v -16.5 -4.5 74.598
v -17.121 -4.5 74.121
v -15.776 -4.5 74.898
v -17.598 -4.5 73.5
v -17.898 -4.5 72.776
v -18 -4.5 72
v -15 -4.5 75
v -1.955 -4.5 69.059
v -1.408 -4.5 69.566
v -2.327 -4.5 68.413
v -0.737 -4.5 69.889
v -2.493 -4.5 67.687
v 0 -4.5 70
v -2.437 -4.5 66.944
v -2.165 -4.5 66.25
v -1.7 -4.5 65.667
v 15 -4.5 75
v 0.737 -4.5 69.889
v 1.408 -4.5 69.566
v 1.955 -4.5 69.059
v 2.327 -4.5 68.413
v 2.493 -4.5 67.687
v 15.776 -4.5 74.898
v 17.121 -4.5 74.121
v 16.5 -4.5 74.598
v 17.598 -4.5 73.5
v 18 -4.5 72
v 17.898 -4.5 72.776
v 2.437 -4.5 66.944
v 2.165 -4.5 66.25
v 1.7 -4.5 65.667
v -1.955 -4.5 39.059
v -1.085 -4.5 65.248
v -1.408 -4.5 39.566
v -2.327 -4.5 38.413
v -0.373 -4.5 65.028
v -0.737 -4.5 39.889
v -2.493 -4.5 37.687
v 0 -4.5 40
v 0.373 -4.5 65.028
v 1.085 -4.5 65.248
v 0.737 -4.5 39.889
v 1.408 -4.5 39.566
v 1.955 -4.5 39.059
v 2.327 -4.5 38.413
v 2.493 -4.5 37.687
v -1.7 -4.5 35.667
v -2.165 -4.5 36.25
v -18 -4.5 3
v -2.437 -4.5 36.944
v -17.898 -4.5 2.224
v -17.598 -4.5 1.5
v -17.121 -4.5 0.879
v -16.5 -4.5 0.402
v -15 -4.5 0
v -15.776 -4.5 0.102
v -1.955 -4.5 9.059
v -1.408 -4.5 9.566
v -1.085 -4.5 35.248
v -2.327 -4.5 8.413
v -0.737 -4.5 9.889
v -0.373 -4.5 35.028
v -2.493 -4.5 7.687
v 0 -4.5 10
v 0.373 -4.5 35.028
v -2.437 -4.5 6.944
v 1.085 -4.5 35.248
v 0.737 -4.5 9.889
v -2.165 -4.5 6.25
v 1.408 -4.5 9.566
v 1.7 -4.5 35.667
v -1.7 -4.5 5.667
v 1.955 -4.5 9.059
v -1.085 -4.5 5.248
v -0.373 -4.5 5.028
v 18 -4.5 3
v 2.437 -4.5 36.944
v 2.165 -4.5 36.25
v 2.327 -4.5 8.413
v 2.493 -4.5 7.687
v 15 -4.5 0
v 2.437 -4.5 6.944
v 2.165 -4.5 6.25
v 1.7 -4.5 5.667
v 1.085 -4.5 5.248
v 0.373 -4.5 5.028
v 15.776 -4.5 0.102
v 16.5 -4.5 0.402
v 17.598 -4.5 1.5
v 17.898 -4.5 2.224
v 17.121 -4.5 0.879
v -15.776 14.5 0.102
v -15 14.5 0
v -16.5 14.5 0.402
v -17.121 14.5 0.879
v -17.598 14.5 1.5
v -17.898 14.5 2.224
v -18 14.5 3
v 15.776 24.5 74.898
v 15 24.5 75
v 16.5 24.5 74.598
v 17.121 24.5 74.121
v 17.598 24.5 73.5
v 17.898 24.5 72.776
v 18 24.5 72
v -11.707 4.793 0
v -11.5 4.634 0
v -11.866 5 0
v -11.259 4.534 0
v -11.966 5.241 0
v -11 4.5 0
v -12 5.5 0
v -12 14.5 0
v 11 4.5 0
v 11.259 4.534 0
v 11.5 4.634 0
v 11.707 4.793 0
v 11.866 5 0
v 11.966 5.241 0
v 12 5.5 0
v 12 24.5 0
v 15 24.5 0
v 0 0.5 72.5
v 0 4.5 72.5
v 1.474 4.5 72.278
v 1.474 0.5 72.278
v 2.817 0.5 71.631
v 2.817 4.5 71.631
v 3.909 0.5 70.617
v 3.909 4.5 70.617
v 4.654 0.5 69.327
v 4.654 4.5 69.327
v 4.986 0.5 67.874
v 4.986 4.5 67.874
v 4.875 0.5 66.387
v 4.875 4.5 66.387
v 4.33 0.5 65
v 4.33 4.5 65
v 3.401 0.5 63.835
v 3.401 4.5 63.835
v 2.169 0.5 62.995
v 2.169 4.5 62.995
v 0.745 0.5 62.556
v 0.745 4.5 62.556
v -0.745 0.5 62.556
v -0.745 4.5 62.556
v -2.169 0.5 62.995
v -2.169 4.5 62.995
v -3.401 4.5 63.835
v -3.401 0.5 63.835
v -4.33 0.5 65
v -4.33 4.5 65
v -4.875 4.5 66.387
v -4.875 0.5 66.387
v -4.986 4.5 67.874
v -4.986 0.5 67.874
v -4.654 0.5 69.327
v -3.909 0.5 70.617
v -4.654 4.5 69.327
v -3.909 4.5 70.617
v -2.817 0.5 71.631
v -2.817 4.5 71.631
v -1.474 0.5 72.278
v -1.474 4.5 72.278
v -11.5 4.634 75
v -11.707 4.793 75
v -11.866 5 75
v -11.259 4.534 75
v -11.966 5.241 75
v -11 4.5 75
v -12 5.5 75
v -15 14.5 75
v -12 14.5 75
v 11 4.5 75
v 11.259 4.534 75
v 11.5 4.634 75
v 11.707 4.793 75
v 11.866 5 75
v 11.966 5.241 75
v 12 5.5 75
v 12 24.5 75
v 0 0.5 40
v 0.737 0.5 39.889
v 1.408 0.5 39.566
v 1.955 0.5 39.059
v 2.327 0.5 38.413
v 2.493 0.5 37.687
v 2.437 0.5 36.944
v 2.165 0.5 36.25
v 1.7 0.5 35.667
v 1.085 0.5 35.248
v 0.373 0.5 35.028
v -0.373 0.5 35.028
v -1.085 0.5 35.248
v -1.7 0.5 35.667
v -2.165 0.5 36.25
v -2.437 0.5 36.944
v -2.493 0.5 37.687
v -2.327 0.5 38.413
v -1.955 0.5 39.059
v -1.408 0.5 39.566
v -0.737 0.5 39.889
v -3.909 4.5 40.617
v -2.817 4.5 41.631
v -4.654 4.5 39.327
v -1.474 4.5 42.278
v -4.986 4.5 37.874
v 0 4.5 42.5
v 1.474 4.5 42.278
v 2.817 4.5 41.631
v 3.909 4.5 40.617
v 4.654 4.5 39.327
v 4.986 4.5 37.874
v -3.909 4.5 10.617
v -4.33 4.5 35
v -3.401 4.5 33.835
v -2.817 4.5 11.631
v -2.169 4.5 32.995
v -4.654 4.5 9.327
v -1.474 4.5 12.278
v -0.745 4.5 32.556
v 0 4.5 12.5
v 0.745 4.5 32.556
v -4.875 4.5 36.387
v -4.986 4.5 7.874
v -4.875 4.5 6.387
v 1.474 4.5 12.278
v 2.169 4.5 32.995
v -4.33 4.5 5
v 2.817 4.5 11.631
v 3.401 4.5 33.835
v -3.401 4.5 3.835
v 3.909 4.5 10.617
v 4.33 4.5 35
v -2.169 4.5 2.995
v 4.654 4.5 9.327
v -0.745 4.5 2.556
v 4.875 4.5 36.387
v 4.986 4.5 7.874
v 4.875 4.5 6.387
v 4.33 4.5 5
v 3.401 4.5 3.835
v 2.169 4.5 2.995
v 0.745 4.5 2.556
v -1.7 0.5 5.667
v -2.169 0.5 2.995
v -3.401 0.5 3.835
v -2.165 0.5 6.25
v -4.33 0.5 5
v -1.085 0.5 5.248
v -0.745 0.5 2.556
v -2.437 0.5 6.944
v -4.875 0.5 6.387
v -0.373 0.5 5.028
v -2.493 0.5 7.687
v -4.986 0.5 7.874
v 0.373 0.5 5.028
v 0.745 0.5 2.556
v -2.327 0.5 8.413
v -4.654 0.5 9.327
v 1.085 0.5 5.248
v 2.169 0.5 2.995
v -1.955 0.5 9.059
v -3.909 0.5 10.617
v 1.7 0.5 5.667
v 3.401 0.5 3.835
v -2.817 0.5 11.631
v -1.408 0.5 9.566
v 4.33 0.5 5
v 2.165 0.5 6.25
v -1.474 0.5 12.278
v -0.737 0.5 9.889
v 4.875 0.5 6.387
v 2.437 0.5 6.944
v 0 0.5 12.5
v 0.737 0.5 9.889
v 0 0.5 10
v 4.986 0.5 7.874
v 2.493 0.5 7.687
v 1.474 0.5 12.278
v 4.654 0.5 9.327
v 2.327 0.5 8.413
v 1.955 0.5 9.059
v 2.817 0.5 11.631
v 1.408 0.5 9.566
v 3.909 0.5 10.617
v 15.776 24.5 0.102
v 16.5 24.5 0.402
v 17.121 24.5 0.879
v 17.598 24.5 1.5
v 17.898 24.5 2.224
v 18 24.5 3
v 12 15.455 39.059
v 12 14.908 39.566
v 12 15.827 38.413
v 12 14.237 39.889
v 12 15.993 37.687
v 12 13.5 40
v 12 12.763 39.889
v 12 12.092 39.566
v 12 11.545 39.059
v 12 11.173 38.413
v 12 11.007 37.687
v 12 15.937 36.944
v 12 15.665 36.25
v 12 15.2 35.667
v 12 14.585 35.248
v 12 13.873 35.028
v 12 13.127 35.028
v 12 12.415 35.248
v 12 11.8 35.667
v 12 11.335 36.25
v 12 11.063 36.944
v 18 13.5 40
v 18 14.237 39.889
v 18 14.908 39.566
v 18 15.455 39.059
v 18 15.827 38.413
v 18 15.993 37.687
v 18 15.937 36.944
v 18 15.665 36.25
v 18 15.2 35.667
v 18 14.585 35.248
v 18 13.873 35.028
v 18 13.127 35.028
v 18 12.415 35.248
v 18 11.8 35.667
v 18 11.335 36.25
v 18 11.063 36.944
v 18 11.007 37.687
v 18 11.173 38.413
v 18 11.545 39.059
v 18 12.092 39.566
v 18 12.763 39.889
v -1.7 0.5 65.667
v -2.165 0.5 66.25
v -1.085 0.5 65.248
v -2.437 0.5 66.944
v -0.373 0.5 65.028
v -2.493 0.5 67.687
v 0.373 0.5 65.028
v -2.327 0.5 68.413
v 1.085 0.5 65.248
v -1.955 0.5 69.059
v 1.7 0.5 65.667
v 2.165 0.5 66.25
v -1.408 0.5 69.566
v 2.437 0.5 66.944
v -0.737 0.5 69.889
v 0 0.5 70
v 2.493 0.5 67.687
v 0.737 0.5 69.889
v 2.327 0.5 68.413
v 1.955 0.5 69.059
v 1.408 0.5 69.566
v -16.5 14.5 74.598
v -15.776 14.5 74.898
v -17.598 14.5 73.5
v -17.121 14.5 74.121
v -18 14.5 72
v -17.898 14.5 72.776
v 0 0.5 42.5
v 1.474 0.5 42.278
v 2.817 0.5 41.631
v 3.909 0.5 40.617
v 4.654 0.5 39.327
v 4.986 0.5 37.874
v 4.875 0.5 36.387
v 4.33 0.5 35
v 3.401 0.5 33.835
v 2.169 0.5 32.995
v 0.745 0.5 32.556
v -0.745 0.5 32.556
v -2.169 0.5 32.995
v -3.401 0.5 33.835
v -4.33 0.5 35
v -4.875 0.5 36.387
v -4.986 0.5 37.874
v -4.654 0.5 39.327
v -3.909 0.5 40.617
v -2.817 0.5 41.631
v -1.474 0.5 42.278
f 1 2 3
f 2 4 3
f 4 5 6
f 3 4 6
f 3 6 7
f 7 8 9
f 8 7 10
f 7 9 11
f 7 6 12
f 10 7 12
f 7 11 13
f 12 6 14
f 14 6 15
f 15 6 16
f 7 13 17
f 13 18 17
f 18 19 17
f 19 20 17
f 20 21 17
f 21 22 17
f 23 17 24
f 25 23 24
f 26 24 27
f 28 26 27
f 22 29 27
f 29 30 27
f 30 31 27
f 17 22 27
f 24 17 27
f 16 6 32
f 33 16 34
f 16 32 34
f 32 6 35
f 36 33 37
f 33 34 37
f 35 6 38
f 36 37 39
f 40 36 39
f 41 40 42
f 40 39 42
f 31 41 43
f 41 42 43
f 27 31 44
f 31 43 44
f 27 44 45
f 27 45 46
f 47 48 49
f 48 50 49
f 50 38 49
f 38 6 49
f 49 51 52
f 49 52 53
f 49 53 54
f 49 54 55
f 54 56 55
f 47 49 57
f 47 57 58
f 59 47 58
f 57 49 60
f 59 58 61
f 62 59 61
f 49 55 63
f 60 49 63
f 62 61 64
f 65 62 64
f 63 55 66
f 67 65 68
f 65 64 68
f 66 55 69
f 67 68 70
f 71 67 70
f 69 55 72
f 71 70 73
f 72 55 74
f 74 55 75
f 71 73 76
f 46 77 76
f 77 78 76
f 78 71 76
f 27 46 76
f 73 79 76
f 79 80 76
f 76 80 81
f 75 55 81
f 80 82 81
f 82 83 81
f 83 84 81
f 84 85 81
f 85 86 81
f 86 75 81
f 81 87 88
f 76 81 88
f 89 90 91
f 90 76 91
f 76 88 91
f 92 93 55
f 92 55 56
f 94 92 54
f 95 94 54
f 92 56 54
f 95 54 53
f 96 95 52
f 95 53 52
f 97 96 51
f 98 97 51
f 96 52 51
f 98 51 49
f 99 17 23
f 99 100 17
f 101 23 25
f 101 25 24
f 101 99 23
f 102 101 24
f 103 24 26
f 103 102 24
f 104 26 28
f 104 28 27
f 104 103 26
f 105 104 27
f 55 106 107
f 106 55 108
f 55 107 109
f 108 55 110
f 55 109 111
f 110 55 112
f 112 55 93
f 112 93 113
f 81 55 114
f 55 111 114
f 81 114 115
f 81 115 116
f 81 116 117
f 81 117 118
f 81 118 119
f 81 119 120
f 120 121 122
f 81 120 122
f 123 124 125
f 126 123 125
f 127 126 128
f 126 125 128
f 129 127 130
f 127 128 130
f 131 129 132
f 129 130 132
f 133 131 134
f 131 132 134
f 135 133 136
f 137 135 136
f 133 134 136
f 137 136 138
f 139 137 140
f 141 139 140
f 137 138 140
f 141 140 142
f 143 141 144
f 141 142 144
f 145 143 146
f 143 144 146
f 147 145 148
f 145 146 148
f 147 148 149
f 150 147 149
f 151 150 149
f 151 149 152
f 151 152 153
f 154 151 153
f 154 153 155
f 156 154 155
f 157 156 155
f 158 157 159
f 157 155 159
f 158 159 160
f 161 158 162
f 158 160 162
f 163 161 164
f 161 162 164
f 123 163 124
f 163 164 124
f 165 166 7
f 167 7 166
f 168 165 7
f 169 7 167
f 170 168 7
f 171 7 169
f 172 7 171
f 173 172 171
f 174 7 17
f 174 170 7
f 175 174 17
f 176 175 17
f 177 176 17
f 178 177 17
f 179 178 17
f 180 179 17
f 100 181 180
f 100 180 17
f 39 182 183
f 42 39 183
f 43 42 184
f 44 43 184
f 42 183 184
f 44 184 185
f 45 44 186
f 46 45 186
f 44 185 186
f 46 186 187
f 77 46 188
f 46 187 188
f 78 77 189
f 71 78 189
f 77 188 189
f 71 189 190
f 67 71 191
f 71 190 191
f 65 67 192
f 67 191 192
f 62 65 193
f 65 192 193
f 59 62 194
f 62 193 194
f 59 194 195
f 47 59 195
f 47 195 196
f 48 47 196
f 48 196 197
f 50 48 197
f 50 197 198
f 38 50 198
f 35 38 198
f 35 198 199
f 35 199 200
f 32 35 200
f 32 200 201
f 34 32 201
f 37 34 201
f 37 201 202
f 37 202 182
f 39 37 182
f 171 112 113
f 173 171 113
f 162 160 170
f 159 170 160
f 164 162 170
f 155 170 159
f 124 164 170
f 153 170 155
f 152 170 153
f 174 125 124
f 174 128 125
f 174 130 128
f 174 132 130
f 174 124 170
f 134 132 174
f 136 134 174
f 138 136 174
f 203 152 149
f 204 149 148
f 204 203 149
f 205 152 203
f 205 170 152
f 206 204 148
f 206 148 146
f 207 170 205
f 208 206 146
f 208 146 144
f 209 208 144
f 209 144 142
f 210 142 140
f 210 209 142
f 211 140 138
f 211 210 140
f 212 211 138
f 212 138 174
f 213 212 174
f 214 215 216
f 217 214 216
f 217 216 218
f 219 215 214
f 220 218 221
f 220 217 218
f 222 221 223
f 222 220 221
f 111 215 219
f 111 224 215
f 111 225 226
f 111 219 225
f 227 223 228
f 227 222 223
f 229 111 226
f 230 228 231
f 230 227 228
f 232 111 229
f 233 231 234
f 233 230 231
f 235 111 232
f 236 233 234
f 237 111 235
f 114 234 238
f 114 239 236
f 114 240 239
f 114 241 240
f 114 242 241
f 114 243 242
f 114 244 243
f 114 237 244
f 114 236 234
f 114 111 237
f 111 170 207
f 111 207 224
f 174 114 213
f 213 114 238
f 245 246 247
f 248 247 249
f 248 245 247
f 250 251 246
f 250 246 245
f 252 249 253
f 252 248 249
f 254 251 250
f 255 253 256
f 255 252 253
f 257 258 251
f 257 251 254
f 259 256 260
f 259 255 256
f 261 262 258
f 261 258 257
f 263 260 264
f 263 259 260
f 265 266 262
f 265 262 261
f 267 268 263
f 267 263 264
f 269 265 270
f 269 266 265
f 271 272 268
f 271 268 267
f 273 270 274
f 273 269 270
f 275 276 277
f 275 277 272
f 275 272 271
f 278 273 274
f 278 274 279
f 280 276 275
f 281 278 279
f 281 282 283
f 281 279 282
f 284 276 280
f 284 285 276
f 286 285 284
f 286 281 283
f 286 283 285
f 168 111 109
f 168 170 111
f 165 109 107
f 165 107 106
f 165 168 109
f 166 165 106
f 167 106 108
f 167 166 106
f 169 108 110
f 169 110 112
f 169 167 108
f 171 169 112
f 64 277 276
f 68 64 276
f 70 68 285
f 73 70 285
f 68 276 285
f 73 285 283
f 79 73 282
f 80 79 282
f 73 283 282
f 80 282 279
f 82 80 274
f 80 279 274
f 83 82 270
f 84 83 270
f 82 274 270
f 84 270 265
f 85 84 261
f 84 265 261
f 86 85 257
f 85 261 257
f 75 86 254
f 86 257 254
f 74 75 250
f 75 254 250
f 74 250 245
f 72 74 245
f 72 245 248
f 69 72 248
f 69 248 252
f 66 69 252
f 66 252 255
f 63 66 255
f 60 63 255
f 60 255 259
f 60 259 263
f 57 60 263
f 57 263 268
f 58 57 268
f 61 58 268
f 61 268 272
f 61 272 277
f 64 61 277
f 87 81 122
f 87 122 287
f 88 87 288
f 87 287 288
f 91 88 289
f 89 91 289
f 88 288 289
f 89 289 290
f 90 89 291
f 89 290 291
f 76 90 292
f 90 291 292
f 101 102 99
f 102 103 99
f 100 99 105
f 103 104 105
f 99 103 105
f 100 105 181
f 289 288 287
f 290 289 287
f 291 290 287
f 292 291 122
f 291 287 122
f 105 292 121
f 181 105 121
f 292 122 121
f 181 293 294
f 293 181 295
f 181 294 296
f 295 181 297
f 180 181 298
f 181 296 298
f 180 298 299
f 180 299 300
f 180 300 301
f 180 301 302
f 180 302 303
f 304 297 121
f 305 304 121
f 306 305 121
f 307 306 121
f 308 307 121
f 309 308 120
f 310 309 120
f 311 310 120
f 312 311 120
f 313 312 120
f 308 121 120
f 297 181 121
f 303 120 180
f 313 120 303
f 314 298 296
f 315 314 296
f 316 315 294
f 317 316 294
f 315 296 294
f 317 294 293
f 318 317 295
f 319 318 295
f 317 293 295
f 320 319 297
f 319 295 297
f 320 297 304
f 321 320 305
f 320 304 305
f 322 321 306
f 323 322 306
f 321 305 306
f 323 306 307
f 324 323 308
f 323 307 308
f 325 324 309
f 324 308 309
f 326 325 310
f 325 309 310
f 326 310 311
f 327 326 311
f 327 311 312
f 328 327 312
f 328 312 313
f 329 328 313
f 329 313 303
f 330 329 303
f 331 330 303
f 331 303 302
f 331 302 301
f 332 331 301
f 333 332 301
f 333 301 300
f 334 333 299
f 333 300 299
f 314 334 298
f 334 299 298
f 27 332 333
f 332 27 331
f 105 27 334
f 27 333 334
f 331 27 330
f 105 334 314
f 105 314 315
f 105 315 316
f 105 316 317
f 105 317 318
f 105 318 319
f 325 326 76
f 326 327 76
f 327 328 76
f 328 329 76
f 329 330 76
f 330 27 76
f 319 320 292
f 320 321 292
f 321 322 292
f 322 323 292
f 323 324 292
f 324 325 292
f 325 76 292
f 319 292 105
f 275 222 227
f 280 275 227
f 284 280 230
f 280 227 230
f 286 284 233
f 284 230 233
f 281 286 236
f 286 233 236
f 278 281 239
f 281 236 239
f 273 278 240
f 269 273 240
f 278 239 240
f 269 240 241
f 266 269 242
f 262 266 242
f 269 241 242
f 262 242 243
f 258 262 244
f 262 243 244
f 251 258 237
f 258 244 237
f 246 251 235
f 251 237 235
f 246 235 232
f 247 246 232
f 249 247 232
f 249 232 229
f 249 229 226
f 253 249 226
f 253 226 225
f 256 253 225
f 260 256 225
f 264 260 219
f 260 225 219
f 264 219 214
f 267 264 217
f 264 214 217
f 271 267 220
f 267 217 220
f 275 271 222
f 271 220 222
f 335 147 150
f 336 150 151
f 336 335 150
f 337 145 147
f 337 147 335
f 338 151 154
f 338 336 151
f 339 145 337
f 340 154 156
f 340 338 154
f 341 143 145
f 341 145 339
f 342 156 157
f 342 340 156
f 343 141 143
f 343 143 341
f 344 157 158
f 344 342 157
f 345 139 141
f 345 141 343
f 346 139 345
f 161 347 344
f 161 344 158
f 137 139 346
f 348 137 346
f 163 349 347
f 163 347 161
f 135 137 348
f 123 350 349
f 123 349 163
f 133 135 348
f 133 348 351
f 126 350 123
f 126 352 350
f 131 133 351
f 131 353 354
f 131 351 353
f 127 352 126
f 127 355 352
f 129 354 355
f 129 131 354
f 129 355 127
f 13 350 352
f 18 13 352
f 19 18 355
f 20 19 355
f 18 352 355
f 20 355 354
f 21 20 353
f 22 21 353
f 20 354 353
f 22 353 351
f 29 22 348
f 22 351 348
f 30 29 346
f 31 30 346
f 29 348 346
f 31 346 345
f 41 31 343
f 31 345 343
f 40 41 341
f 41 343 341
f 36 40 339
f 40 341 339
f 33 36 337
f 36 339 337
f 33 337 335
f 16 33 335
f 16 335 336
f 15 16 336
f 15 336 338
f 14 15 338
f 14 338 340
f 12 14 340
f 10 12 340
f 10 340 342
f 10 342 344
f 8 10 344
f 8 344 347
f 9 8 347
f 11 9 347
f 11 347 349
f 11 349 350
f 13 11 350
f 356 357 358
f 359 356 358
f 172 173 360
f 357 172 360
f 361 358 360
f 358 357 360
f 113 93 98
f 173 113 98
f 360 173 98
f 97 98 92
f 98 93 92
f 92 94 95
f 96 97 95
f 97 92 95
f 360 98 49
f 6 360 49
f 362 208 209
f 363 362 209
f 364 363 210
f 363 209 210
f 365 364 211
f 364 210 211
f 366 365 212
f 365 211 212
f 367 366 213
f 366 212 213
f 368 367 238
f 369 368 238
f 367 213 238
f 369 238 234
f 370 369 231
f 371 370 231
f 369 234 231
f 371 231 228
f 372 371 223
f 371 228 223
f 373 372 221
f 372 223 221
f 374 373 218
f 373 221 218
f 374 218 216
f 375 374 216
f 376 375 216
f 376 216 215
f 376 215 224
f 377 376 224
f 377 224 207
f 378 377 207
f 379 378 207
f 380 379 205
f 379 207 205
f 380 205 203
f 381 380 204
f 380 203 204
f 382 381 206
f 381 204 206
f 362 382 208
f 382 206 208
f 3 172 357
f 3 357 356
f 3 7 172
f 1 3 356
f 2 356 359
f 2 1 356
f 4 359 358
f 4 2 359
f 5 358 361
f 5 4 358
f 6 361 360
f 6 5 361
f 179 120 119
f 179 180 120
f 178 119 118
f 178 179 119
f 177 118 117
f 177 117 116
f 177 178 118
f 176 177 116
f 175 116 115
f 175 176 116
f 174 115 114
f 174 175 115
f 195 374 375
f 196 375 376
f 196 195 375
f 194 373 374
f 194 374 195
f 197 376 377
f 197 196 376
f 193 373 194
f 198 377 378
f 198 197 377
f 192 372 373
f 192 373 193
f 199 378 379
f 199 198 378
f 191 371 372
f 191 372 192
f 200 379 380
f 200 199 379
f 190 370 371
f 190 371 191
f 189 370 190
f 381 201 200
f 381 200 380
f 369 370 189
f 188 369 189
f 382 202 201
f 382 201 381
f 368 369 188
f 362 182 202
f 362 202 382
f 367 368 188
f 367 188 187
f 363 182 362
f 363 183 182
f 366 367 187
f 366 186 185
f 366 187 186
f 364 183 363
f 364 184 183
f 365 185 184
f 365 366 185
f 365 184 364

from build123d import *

# Parameters (mm, degrees)
SKETCH1_W           = 24
SKETCH1_H           = 9
BOSS_EXTRUDE1_DEPTH = 75
FILLET1_R           = 1
FILLET2_R           = 3
SKETCH2_R           = 2.5
CUT_EXTRUDE1_DEPTH  = 6
SKETCH3_R           = 2.5
CUT_EXTRUDE2_DEPTH  = 10
SKETCH4_R           = 5
CUT_EXTRUDE3_DEPTH  = 4


with BuildPart() as part:
    # Sketch1 → Boss-Extrude1 (new body)
    with BuildSketch(Plane.XY):
        Polygon((-18, -4.5), (-12, -4.5), (-12, 4.5), (-12, 14.5), (-18, 14.5), align=None)
        Rectangle(SKETCH1_W, SKETCH1_H)
        Polygon((12, 4.5), (12, -4.5), (18, -4.5), (18, 24.5), (12, 24.5), align=None)
    extrude(amount=BOSS_EXTRUDE1_DEPTH)

    # Fillet1
    fillet1_edges = [part.edges().sort_by_distance(p)[0] for p in [
        (-12, 4.5, 37.5),
        (12, 4.5, 37.5),
    ]]
    fillet(fillet1_edges, radius=FILLET1_R)

    # Fillet2
    fillet2_edges = [part.edges().sort_by_distance(p)[0] for p in [
        (18, 10, 0),
        (-18, 5, 0),
        (18, 10, 75),
        (-18, 5, 75),
    ]]
    fillet(fillet2_edges, radius=FILLET2_R)

    # Sketch2 → Cut-Extrude1 (cut)
    with BuildSketch(Plane.ZY.offset(-12)):
        with Locations((37.5, 13.5)):
            Circle(SKETCH2_R)
    extrude(amount=-CUT_EXTRUDE1_DEPTH, mode=Mode.SUBTRACT)

    # Sketch3 → Cut-Extrude2 (cut)
    with BuildSketch(Plane(origin=(0, 4.5, 0), x_dir=(1, 0, 0), z_dir=(0, 1, 0))):
        with Locations(Location((0, -37.5, 0), (0, 0, 270))):
            Circle(SKETCH3_R)
        with Locations(Location((0, -7.5, 0), (0, 0, 270))):
            Circle(SKETCH3_R)
        with Locations(Location((0, -67.5, 0), (0, 0, 270))):
            Circle(SKETCH3_R)
    extrude(amount=-CUT_EXTRUDE2_DEPTH, mode=Mode.SUBTRACT)

    # Sketch4 → Cut-Extrude3 (cut)
    with BuildSketch(Plane(origin=(0, 4.5, 0), x_dir=(1, 0, 0), z_dir=(0, 1, 0))):
        with Locations(Location((0, -7.5, 0), (0, 0, 270))):
            Circle(SKETCH4_R)
        with Locations(Location((0, -37.5, 0), (0, 0, 270))):
            Circle(SKETCH4_R)
        with Locations(Location((0, -67.5, 0), (0, 0, 270))):
            Circle(SKETCH4_R)
    extrude(amount=-CUT_EXTRUDE3_DEPTH, mode=Mode.SUBTRACT)


solid = part.part
